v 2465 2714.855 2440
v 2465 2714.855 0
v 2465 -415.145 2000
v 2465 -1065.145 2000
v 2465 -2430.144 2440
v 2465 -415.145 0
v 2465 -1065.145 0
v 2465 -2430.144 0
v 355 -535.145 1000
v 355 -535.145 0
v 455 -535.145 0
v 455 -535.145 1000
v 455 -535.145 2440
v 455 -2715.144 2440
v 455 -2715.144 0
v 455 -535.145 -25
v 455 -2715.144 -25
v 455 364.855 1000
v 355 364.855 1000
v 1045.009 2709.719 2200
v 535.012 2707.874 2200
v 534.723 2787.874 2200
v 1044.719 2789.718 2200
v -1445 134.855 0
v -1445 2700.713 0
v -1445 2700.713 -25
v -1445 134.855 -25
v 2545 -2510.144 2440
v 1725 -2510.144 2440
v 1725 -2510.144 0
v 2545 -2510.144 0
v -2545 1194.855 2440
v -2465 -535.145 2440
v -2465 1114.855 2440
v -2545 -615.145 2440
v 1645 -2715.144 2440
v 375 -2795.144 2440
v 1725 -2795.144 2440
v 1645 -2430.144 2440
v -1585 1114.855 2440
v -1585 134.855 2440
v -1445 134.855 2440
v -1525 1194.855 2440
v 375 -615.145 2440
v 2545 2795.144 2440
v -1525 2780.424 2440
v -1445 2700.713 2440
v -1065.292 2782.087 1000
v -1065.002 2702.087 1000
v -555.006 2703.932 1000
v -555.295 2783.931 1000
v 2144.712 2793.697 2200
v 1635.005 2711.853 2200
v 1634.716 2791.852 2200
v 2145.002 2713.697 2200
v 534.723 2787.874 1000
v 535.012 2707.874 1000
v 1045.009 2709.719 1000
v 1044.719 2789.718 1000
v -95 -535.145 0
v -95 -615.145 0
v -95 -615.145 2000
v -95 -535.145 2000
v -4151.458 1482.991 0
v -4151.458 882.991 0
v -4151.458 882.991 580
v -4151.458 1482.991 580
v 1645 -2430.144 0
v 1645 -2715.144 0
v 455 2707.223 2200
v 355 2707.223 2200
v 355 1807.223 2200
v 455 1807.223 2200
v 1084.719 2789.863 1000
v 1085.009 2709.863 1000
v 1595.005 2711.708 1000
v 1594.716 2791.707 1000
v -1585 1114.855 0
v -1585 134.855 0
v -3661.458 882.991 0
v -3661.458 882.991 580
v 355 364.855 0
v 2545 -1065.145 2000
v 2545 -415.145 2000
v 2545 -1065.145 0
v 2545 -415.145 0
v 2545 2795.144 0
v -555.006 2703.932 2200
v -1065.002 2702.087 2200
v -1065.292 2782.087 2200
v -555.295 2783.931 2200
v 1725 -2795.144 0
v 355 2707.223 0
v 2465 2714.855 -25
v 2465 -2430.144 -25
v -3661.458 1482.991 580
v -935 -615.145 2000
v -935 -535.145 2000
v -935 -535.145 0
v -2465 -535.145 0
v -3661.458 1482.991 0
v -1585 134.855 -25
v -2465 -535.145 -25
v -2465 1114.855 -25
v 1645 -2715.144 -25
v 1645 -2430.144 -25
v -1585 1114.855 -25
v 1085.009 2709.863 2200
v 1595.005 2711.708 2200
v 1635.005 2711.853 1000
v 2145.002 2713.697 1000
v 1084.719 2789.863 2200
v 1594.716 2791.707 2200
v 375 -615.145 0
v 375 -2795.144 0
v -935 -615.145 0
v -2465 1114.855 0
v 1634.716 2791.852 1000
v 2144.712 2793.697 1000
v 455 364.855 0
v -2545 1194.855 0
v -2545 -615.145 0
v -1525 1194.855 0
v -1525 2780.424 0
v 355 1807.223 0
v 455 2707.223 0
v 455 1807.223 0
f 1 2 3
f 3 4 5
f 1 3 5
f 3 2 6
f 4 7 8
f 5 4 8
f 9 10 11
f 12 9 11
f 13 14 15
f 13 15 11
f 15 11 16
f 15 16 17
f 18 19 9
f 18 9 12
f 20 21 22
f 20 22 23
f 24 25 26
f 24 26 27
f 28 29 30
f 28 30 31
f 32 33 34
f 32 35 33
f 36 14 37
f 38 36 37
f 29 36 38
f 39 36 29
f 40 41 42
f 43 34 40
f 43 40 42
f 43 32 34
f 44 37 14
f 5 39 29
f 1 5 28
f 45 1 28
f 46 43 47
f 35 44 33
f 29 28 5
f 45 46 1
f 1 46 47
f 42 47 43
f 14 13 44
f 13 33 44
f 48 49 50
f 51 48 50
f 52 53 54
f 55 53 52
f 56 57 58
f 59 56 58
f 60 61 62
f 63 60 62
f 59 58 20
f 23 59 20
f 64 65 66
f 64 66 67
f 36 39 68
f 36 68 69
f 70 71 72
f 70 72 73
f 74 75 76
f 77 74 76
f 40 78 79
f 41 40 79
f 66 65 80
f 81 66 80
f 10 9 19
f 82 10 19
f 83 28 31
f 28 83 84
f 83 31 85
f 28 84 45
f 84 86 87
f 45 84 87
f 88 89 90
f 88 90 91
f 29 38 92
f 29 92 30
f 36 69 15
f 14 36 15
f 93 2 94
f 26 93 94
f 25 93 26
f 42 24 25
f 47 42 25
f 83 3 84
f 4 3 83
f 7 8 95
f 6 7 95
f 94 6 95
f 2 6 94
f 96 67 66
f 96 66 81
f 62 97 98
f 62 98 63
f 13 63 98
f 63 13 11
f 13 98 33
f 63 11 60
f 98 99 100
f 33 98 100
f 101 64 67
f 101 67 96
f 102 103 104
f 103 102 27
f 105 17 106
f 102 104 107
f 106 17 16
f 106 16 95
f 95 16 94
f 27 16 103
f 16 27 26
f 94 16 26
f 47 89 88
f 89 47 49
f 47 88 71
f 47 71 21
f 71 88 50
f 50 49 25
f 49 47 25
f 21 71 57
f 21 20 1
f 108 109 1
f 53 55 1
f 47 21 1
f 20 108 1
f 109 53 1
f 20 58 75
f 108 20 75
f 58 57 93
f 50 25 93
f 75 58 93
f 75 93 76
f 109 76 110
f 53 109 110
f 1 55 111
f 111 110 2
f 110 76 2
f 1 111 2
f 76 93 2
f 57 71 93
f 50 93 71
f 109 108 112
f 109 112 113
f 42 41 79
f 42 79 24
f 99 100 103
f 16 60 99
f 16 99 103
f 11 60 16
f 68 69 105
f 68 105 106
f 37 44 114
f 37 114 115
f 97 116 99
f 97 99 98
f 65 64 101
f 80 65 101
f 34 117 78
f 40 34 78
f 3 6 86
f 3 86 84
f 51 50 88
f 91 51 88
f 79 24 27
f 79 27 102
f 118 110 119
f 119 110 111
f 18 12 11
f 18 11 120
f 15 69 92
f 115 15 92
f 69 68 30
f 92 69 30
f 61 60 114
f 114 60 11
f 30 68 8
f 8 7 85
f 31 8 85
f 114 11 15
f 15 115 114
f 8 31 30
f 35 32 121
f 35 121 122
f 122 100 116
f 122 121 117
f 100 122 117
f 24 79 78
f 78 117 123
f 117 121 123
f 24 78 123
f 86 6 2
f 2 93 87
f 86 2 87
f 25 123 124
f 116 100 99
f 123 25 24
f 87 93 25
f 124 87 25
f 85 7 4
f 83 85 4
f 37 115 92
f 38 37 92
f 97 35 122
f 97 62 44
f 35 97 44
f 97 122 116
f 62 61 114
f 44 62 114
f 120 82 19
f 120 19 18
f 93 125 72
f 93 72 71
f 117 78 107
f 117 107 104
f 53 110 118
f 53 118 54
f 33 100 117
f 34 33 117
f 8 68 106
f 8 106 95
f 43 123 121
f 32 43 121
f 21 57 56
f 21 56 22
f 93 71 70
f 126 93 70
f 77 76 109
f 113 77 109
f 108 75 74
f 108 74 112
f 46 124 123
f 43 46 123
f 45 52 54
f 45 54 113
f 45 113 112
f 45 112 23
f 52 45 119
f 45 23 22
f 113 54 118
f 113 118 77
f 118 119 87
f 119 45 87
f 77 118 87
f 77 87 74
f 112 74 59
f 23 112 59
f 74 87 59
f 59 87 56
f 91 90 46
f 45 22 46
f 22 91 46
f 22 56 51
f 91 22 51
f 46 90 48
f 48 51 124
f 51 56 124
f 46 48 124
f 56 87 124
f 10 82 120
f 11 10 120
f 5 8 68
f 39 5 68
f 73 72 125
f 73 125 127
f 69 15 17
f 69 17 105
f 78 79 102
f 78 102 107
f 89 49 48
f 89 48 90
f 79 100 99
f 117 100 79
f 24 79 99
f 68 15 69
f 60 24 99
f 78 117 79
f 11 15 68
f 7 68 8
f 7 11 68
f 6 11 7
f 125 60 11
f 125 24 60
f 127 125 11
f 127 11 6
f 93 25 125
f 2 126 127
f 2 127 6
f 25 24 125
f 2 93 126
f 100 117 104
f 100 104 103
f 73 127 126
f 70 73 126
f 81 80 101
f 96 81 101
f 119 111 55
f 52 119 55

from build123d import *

# Parameters (mm, degrees)
F1_DEPTH  = 25
F2_DEPTH  = 2440
F3_W      = 840
F3_H      = 2000
F4_DEPTH  = 80
F5_W      = 100
F5_H      = 900
F6_DEPTH  = 2200
F7_W      = 100
F7_H      = 900
F8_DEPTH  = 1000
F9_W      = 510
F9_H      = 1200
F10_DEPTH = 79.9999997254
F11_W     = 490
F11_H     = 600
F12_DEPTH = 580
F13_W     = 650
F13_H     = 2000
F14_DEPTH = 80


with BuildPart() as f1:
    # F0 (on Top) → F1 (new body)
    with BuildSketch(Plane.XY):
        Polygon((-1444.999707, 134.855174), (-1584.999679, 134.855174), (-1584.999679, 1114.85484), (-2464.999501, 1114.85484), (-2464.999501, -535.144826), (454.999908, -535.144826), (454.999908, -2715.144385), (1644.999502, -2715.144385), (1644.999502, -2430.144385), (2464.999502, -2430.144385), (2464.999502, 2714.854517), (-1444.999707, 2700.712775), align=None)
    extrude(amount=-F1_DEPTH)



with BuildPart() as f2:
    # F0 (on Top) → F2 (new body)
    with BuildSketch(Plane.XY):
        Polygon((-1524.999707, 2780.423953), (-1524.999707, 1194.85484), (-2544.999501, 1194.85484), (-2544.999501, -615.144826), (374.999908, -615.144826), (374.999908, -2795.144385), (1724.999502, -2795.144385), (1724.999502, -2510.144385), (2544.999502, -2510.144385), (2544.999502, 2795.144385), align=None)
        Polygon((-1584.999679, 1114.85484), (-1584.999679, 134.855174), (-1444.999707, 134.855174), (-1444.999707, 2700.712775), (2464.999502, 2714.854517), (2464.999502, -2430.144385), (1644.999502, -2430.144385), (1644.999502, -2715.144385), (454.999908, -2715.144385), (454.999908, -535.144826), (-2464.999501, -535.144826), (-2464.999501, 1114.85484), align=None, mode=Mode.SUBTRACT)
    extrude(amount=F2_DEPTH)

    # F3 (on face) → F4 (cut, through all)
    with BuildSketch(Plane.XZ.offset(615.144826)):
        with Locations((-515.000092, 1000)):
            Rectangle(F3_W, F3_H)
    extrude(amount=-F4_DEPTH, mode=Mode.SUBTRACT)


with BuildPart() as f1_1:
    add(f1.part)

    add(f2.part)  # F6 merges F2
    # F5 (on face) → F6 (join)
    with BuildSketch(Plane.XY):
        with Locations((405.000293, 2257.2230411764)):
            Rectangle(F5_W, F5_H)
    extrude(amount=F6_DEPTH)

    # F9 (on face) → F10 (cut, through all)
    with BuildSketch(Plane(origin=(-9.7867517589, 2705.903674088, 0), x_dir=(0.9999934594, 0.0036167909, 0), z_dir=(0.0036167909, -0.9999934594, 0))):
        with Locations((799.8024404753, 1600)):
            Rectangle(F9_W, F9_H)
        with Locations((-800.2223424701, 1600)):
            Rectangle(F9_W, F9_H)
        with Locations((1899.8024404753, 1600)):
            Rectangle(F9_W, F9_H)
        with Locations((1349.8024404753, 1600)):
            Rectangle(F9_W, F9_H)
    extrude(amount=-F10_DEPTH, mode=Mode.SUBTRACT)

    # F13 (on face) → F14 (cut, through all)
    with BuildSketch(Plane(origin=(2464.999502, 0, 0), x_dir=(0, -1, 0), z_dir=(-1, 0, 0))):
        with Locations((740.145483, 1000)):
            Rectangle(F13_W, F13_H)
    extrude(amount=-F14_DEPTH, mode=Mode.SUBTRACT)


with BuildPart() as f8:
    # F7 (on face) → F8 (new body)
    with BuildSketch(Plane.XY):
        with Locations((404.999908, -85.144826)):
            Rectangle(F7_W, F7_H)
    extrude(amount=F8_DEPTH)


with BuildPart() as f12:
    # F11 (on face) → F12 (new body)
    with BuildSketch(Plane.XY):
        with Locations((-3906.4578610846, 1182.9909682274)):
            Rectangle(F11_W, F11_H)
    extrude(amount=F12_DEPTH)


solid = Compound([f1_1.part, f8.part, f12.part])
